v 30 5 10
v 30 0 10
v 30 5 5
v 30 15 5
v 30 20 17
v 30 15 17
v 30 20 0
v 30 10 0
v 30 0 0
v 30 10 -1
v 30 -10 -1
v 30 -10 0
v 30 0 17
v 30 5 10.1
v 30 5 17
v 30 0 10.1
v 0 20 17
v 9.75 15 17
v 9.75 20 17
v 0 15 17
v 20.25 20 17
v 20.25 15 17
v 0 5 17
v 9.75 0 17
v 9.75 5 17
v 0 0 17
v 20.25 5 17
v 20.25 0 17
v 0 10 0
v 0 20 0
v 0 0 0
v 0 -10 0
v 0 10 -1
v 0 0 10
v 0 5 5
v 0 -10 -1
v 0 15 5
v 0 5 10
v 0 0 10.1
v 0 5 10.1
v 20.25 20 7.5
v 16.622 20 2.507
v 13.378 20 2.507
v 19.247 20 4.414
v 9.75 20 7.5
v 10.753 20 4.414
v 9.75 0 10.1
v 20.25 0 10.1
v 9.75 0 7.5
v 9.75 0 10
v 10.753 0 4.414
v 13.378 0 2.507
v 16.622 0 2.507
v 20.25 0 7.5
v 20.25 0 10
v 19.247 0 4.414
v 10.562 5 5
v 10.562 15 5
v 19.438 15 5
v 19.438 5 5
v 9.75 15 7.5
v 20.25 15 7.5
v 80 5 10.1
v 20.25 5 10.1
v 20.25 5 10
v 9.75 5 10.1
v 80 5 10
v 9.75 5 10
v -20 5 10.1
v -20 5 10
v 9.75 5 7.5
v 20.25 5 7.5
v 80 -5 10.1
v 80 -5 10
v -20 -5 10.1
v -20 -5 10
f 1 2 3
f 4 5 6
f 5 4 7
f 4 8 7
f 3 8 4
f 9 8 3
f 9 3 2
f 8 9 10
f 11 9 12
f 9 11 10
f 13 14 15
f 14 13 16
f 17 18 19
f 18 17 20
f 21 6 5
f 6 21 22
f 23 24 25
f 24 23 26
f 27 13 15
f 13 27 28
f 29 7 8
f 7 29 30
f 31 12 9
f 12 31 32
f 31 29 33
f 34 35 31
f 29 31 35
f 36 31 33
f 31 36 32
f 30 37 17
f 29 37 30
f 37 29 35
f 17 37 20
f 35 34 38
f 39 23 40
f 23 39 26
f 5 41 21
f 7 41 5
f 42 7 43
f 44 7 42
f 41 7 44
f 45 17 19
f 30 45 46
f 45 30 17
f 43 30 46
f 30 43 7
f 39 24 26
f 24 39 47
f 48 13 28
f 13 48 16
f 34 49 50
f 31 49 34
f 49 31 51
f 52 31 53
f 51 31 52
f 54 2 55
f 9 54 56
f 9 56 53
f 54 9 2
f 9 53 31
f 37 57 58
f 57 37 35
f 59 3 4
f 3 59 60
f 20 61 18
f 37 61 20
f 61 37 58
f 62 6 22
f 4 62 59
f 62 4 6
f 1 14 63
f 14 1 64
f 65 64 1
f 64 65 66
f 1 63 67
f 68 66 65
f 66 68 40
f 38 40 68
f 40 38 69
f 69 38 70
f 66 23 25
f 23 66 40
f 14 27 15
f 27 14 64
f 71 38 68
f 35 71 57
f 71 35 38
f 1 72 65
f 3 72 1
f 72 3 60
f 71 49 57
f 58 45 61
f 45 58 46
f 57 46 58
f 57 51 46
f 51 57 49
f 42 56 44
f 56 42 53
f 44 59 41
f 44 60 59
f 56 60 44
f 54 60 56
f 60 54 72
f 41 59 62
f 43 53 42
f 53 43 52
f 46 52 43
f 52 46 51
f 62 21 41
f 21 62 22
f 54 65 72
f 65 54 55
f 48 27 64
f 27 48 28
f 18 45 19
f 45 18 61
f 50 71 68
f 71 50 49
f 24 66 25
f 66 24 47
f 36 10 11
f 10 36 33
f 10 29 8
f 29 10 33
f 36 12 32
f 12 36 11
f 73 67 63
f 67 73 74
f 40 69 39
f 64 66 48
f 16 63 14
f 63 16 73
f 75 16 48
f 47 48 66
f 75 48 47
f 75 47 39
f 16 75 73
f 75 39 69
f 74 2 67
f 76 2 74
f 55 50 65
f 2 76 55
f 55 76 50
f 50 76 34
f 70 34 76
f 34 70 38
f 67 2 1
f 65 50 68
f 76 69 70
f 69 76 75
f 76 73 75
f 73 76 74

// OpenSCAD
// a window stopper with rotating wedge
// (all sizes in millimeter)

module window_stopper(

    /* parameters */
    
    window_thickness = 10,   // thickness of window frame
    windowsill_dist = 10,        // distance between window and windowsill
    windowsill_adj = 1,     // adjustment for windowsill distance
    stopper_width = 30,     // width of the stopper
    material_thickness = 5,     // material thickness of the stopper
    window_overlap = 7,     // overlap of stopper and window
    axle_dm = 10,       // axle diameter
    axle_clearance = 0.5,       // axle clearance towards bushing
    
) {
    
    $fn = 10;
    
    axle_height =
        material_thickness + (windowsill_dist - material_thickness) / 2;
    
    module window() {
        color("LightSkyBlue")
            translate( [ -20, -window_thickness / 2, windowsill_dist])
                cube( [100, window_thickness, 0.1]);
        }
    
    module stopper_case() {
        case_size = [
            stopper_width,
            window_thickness + material_thickness * 2,
            windowsill_dist + window_overlap
        ];
        
        difference() {
            cube( case_size );
            axle_bushing = axle_dm + axle_clearance;
            
            translate( [-1, material_thickness, material_thickness] )
                cube( [case_size.x + 2, window_thickness, case_size.z] );
            
            translate( [case_size.x / 2, -1, axle_height] )
                rotate( [-90,0.0])
                    cylinder( d = axle_bushing, h = case_size.y + 2);
            
            translate( [(case_size.x - axle_bushing) / 2, -1, axle_height] )
                cube( [axle_bushing, case_size.y + 2, case_size.z] );
        }
        
        translate( [0, -case_size.y / 2, -windowsill_adj] )
            cube( [case_size.x, case_size.y, windowsill_adj] );
        
        }
    
    module stopper() {}
    
    window();
    stopper_case();
    stopper();
    
}

window_stopper( /* parameters */ );
